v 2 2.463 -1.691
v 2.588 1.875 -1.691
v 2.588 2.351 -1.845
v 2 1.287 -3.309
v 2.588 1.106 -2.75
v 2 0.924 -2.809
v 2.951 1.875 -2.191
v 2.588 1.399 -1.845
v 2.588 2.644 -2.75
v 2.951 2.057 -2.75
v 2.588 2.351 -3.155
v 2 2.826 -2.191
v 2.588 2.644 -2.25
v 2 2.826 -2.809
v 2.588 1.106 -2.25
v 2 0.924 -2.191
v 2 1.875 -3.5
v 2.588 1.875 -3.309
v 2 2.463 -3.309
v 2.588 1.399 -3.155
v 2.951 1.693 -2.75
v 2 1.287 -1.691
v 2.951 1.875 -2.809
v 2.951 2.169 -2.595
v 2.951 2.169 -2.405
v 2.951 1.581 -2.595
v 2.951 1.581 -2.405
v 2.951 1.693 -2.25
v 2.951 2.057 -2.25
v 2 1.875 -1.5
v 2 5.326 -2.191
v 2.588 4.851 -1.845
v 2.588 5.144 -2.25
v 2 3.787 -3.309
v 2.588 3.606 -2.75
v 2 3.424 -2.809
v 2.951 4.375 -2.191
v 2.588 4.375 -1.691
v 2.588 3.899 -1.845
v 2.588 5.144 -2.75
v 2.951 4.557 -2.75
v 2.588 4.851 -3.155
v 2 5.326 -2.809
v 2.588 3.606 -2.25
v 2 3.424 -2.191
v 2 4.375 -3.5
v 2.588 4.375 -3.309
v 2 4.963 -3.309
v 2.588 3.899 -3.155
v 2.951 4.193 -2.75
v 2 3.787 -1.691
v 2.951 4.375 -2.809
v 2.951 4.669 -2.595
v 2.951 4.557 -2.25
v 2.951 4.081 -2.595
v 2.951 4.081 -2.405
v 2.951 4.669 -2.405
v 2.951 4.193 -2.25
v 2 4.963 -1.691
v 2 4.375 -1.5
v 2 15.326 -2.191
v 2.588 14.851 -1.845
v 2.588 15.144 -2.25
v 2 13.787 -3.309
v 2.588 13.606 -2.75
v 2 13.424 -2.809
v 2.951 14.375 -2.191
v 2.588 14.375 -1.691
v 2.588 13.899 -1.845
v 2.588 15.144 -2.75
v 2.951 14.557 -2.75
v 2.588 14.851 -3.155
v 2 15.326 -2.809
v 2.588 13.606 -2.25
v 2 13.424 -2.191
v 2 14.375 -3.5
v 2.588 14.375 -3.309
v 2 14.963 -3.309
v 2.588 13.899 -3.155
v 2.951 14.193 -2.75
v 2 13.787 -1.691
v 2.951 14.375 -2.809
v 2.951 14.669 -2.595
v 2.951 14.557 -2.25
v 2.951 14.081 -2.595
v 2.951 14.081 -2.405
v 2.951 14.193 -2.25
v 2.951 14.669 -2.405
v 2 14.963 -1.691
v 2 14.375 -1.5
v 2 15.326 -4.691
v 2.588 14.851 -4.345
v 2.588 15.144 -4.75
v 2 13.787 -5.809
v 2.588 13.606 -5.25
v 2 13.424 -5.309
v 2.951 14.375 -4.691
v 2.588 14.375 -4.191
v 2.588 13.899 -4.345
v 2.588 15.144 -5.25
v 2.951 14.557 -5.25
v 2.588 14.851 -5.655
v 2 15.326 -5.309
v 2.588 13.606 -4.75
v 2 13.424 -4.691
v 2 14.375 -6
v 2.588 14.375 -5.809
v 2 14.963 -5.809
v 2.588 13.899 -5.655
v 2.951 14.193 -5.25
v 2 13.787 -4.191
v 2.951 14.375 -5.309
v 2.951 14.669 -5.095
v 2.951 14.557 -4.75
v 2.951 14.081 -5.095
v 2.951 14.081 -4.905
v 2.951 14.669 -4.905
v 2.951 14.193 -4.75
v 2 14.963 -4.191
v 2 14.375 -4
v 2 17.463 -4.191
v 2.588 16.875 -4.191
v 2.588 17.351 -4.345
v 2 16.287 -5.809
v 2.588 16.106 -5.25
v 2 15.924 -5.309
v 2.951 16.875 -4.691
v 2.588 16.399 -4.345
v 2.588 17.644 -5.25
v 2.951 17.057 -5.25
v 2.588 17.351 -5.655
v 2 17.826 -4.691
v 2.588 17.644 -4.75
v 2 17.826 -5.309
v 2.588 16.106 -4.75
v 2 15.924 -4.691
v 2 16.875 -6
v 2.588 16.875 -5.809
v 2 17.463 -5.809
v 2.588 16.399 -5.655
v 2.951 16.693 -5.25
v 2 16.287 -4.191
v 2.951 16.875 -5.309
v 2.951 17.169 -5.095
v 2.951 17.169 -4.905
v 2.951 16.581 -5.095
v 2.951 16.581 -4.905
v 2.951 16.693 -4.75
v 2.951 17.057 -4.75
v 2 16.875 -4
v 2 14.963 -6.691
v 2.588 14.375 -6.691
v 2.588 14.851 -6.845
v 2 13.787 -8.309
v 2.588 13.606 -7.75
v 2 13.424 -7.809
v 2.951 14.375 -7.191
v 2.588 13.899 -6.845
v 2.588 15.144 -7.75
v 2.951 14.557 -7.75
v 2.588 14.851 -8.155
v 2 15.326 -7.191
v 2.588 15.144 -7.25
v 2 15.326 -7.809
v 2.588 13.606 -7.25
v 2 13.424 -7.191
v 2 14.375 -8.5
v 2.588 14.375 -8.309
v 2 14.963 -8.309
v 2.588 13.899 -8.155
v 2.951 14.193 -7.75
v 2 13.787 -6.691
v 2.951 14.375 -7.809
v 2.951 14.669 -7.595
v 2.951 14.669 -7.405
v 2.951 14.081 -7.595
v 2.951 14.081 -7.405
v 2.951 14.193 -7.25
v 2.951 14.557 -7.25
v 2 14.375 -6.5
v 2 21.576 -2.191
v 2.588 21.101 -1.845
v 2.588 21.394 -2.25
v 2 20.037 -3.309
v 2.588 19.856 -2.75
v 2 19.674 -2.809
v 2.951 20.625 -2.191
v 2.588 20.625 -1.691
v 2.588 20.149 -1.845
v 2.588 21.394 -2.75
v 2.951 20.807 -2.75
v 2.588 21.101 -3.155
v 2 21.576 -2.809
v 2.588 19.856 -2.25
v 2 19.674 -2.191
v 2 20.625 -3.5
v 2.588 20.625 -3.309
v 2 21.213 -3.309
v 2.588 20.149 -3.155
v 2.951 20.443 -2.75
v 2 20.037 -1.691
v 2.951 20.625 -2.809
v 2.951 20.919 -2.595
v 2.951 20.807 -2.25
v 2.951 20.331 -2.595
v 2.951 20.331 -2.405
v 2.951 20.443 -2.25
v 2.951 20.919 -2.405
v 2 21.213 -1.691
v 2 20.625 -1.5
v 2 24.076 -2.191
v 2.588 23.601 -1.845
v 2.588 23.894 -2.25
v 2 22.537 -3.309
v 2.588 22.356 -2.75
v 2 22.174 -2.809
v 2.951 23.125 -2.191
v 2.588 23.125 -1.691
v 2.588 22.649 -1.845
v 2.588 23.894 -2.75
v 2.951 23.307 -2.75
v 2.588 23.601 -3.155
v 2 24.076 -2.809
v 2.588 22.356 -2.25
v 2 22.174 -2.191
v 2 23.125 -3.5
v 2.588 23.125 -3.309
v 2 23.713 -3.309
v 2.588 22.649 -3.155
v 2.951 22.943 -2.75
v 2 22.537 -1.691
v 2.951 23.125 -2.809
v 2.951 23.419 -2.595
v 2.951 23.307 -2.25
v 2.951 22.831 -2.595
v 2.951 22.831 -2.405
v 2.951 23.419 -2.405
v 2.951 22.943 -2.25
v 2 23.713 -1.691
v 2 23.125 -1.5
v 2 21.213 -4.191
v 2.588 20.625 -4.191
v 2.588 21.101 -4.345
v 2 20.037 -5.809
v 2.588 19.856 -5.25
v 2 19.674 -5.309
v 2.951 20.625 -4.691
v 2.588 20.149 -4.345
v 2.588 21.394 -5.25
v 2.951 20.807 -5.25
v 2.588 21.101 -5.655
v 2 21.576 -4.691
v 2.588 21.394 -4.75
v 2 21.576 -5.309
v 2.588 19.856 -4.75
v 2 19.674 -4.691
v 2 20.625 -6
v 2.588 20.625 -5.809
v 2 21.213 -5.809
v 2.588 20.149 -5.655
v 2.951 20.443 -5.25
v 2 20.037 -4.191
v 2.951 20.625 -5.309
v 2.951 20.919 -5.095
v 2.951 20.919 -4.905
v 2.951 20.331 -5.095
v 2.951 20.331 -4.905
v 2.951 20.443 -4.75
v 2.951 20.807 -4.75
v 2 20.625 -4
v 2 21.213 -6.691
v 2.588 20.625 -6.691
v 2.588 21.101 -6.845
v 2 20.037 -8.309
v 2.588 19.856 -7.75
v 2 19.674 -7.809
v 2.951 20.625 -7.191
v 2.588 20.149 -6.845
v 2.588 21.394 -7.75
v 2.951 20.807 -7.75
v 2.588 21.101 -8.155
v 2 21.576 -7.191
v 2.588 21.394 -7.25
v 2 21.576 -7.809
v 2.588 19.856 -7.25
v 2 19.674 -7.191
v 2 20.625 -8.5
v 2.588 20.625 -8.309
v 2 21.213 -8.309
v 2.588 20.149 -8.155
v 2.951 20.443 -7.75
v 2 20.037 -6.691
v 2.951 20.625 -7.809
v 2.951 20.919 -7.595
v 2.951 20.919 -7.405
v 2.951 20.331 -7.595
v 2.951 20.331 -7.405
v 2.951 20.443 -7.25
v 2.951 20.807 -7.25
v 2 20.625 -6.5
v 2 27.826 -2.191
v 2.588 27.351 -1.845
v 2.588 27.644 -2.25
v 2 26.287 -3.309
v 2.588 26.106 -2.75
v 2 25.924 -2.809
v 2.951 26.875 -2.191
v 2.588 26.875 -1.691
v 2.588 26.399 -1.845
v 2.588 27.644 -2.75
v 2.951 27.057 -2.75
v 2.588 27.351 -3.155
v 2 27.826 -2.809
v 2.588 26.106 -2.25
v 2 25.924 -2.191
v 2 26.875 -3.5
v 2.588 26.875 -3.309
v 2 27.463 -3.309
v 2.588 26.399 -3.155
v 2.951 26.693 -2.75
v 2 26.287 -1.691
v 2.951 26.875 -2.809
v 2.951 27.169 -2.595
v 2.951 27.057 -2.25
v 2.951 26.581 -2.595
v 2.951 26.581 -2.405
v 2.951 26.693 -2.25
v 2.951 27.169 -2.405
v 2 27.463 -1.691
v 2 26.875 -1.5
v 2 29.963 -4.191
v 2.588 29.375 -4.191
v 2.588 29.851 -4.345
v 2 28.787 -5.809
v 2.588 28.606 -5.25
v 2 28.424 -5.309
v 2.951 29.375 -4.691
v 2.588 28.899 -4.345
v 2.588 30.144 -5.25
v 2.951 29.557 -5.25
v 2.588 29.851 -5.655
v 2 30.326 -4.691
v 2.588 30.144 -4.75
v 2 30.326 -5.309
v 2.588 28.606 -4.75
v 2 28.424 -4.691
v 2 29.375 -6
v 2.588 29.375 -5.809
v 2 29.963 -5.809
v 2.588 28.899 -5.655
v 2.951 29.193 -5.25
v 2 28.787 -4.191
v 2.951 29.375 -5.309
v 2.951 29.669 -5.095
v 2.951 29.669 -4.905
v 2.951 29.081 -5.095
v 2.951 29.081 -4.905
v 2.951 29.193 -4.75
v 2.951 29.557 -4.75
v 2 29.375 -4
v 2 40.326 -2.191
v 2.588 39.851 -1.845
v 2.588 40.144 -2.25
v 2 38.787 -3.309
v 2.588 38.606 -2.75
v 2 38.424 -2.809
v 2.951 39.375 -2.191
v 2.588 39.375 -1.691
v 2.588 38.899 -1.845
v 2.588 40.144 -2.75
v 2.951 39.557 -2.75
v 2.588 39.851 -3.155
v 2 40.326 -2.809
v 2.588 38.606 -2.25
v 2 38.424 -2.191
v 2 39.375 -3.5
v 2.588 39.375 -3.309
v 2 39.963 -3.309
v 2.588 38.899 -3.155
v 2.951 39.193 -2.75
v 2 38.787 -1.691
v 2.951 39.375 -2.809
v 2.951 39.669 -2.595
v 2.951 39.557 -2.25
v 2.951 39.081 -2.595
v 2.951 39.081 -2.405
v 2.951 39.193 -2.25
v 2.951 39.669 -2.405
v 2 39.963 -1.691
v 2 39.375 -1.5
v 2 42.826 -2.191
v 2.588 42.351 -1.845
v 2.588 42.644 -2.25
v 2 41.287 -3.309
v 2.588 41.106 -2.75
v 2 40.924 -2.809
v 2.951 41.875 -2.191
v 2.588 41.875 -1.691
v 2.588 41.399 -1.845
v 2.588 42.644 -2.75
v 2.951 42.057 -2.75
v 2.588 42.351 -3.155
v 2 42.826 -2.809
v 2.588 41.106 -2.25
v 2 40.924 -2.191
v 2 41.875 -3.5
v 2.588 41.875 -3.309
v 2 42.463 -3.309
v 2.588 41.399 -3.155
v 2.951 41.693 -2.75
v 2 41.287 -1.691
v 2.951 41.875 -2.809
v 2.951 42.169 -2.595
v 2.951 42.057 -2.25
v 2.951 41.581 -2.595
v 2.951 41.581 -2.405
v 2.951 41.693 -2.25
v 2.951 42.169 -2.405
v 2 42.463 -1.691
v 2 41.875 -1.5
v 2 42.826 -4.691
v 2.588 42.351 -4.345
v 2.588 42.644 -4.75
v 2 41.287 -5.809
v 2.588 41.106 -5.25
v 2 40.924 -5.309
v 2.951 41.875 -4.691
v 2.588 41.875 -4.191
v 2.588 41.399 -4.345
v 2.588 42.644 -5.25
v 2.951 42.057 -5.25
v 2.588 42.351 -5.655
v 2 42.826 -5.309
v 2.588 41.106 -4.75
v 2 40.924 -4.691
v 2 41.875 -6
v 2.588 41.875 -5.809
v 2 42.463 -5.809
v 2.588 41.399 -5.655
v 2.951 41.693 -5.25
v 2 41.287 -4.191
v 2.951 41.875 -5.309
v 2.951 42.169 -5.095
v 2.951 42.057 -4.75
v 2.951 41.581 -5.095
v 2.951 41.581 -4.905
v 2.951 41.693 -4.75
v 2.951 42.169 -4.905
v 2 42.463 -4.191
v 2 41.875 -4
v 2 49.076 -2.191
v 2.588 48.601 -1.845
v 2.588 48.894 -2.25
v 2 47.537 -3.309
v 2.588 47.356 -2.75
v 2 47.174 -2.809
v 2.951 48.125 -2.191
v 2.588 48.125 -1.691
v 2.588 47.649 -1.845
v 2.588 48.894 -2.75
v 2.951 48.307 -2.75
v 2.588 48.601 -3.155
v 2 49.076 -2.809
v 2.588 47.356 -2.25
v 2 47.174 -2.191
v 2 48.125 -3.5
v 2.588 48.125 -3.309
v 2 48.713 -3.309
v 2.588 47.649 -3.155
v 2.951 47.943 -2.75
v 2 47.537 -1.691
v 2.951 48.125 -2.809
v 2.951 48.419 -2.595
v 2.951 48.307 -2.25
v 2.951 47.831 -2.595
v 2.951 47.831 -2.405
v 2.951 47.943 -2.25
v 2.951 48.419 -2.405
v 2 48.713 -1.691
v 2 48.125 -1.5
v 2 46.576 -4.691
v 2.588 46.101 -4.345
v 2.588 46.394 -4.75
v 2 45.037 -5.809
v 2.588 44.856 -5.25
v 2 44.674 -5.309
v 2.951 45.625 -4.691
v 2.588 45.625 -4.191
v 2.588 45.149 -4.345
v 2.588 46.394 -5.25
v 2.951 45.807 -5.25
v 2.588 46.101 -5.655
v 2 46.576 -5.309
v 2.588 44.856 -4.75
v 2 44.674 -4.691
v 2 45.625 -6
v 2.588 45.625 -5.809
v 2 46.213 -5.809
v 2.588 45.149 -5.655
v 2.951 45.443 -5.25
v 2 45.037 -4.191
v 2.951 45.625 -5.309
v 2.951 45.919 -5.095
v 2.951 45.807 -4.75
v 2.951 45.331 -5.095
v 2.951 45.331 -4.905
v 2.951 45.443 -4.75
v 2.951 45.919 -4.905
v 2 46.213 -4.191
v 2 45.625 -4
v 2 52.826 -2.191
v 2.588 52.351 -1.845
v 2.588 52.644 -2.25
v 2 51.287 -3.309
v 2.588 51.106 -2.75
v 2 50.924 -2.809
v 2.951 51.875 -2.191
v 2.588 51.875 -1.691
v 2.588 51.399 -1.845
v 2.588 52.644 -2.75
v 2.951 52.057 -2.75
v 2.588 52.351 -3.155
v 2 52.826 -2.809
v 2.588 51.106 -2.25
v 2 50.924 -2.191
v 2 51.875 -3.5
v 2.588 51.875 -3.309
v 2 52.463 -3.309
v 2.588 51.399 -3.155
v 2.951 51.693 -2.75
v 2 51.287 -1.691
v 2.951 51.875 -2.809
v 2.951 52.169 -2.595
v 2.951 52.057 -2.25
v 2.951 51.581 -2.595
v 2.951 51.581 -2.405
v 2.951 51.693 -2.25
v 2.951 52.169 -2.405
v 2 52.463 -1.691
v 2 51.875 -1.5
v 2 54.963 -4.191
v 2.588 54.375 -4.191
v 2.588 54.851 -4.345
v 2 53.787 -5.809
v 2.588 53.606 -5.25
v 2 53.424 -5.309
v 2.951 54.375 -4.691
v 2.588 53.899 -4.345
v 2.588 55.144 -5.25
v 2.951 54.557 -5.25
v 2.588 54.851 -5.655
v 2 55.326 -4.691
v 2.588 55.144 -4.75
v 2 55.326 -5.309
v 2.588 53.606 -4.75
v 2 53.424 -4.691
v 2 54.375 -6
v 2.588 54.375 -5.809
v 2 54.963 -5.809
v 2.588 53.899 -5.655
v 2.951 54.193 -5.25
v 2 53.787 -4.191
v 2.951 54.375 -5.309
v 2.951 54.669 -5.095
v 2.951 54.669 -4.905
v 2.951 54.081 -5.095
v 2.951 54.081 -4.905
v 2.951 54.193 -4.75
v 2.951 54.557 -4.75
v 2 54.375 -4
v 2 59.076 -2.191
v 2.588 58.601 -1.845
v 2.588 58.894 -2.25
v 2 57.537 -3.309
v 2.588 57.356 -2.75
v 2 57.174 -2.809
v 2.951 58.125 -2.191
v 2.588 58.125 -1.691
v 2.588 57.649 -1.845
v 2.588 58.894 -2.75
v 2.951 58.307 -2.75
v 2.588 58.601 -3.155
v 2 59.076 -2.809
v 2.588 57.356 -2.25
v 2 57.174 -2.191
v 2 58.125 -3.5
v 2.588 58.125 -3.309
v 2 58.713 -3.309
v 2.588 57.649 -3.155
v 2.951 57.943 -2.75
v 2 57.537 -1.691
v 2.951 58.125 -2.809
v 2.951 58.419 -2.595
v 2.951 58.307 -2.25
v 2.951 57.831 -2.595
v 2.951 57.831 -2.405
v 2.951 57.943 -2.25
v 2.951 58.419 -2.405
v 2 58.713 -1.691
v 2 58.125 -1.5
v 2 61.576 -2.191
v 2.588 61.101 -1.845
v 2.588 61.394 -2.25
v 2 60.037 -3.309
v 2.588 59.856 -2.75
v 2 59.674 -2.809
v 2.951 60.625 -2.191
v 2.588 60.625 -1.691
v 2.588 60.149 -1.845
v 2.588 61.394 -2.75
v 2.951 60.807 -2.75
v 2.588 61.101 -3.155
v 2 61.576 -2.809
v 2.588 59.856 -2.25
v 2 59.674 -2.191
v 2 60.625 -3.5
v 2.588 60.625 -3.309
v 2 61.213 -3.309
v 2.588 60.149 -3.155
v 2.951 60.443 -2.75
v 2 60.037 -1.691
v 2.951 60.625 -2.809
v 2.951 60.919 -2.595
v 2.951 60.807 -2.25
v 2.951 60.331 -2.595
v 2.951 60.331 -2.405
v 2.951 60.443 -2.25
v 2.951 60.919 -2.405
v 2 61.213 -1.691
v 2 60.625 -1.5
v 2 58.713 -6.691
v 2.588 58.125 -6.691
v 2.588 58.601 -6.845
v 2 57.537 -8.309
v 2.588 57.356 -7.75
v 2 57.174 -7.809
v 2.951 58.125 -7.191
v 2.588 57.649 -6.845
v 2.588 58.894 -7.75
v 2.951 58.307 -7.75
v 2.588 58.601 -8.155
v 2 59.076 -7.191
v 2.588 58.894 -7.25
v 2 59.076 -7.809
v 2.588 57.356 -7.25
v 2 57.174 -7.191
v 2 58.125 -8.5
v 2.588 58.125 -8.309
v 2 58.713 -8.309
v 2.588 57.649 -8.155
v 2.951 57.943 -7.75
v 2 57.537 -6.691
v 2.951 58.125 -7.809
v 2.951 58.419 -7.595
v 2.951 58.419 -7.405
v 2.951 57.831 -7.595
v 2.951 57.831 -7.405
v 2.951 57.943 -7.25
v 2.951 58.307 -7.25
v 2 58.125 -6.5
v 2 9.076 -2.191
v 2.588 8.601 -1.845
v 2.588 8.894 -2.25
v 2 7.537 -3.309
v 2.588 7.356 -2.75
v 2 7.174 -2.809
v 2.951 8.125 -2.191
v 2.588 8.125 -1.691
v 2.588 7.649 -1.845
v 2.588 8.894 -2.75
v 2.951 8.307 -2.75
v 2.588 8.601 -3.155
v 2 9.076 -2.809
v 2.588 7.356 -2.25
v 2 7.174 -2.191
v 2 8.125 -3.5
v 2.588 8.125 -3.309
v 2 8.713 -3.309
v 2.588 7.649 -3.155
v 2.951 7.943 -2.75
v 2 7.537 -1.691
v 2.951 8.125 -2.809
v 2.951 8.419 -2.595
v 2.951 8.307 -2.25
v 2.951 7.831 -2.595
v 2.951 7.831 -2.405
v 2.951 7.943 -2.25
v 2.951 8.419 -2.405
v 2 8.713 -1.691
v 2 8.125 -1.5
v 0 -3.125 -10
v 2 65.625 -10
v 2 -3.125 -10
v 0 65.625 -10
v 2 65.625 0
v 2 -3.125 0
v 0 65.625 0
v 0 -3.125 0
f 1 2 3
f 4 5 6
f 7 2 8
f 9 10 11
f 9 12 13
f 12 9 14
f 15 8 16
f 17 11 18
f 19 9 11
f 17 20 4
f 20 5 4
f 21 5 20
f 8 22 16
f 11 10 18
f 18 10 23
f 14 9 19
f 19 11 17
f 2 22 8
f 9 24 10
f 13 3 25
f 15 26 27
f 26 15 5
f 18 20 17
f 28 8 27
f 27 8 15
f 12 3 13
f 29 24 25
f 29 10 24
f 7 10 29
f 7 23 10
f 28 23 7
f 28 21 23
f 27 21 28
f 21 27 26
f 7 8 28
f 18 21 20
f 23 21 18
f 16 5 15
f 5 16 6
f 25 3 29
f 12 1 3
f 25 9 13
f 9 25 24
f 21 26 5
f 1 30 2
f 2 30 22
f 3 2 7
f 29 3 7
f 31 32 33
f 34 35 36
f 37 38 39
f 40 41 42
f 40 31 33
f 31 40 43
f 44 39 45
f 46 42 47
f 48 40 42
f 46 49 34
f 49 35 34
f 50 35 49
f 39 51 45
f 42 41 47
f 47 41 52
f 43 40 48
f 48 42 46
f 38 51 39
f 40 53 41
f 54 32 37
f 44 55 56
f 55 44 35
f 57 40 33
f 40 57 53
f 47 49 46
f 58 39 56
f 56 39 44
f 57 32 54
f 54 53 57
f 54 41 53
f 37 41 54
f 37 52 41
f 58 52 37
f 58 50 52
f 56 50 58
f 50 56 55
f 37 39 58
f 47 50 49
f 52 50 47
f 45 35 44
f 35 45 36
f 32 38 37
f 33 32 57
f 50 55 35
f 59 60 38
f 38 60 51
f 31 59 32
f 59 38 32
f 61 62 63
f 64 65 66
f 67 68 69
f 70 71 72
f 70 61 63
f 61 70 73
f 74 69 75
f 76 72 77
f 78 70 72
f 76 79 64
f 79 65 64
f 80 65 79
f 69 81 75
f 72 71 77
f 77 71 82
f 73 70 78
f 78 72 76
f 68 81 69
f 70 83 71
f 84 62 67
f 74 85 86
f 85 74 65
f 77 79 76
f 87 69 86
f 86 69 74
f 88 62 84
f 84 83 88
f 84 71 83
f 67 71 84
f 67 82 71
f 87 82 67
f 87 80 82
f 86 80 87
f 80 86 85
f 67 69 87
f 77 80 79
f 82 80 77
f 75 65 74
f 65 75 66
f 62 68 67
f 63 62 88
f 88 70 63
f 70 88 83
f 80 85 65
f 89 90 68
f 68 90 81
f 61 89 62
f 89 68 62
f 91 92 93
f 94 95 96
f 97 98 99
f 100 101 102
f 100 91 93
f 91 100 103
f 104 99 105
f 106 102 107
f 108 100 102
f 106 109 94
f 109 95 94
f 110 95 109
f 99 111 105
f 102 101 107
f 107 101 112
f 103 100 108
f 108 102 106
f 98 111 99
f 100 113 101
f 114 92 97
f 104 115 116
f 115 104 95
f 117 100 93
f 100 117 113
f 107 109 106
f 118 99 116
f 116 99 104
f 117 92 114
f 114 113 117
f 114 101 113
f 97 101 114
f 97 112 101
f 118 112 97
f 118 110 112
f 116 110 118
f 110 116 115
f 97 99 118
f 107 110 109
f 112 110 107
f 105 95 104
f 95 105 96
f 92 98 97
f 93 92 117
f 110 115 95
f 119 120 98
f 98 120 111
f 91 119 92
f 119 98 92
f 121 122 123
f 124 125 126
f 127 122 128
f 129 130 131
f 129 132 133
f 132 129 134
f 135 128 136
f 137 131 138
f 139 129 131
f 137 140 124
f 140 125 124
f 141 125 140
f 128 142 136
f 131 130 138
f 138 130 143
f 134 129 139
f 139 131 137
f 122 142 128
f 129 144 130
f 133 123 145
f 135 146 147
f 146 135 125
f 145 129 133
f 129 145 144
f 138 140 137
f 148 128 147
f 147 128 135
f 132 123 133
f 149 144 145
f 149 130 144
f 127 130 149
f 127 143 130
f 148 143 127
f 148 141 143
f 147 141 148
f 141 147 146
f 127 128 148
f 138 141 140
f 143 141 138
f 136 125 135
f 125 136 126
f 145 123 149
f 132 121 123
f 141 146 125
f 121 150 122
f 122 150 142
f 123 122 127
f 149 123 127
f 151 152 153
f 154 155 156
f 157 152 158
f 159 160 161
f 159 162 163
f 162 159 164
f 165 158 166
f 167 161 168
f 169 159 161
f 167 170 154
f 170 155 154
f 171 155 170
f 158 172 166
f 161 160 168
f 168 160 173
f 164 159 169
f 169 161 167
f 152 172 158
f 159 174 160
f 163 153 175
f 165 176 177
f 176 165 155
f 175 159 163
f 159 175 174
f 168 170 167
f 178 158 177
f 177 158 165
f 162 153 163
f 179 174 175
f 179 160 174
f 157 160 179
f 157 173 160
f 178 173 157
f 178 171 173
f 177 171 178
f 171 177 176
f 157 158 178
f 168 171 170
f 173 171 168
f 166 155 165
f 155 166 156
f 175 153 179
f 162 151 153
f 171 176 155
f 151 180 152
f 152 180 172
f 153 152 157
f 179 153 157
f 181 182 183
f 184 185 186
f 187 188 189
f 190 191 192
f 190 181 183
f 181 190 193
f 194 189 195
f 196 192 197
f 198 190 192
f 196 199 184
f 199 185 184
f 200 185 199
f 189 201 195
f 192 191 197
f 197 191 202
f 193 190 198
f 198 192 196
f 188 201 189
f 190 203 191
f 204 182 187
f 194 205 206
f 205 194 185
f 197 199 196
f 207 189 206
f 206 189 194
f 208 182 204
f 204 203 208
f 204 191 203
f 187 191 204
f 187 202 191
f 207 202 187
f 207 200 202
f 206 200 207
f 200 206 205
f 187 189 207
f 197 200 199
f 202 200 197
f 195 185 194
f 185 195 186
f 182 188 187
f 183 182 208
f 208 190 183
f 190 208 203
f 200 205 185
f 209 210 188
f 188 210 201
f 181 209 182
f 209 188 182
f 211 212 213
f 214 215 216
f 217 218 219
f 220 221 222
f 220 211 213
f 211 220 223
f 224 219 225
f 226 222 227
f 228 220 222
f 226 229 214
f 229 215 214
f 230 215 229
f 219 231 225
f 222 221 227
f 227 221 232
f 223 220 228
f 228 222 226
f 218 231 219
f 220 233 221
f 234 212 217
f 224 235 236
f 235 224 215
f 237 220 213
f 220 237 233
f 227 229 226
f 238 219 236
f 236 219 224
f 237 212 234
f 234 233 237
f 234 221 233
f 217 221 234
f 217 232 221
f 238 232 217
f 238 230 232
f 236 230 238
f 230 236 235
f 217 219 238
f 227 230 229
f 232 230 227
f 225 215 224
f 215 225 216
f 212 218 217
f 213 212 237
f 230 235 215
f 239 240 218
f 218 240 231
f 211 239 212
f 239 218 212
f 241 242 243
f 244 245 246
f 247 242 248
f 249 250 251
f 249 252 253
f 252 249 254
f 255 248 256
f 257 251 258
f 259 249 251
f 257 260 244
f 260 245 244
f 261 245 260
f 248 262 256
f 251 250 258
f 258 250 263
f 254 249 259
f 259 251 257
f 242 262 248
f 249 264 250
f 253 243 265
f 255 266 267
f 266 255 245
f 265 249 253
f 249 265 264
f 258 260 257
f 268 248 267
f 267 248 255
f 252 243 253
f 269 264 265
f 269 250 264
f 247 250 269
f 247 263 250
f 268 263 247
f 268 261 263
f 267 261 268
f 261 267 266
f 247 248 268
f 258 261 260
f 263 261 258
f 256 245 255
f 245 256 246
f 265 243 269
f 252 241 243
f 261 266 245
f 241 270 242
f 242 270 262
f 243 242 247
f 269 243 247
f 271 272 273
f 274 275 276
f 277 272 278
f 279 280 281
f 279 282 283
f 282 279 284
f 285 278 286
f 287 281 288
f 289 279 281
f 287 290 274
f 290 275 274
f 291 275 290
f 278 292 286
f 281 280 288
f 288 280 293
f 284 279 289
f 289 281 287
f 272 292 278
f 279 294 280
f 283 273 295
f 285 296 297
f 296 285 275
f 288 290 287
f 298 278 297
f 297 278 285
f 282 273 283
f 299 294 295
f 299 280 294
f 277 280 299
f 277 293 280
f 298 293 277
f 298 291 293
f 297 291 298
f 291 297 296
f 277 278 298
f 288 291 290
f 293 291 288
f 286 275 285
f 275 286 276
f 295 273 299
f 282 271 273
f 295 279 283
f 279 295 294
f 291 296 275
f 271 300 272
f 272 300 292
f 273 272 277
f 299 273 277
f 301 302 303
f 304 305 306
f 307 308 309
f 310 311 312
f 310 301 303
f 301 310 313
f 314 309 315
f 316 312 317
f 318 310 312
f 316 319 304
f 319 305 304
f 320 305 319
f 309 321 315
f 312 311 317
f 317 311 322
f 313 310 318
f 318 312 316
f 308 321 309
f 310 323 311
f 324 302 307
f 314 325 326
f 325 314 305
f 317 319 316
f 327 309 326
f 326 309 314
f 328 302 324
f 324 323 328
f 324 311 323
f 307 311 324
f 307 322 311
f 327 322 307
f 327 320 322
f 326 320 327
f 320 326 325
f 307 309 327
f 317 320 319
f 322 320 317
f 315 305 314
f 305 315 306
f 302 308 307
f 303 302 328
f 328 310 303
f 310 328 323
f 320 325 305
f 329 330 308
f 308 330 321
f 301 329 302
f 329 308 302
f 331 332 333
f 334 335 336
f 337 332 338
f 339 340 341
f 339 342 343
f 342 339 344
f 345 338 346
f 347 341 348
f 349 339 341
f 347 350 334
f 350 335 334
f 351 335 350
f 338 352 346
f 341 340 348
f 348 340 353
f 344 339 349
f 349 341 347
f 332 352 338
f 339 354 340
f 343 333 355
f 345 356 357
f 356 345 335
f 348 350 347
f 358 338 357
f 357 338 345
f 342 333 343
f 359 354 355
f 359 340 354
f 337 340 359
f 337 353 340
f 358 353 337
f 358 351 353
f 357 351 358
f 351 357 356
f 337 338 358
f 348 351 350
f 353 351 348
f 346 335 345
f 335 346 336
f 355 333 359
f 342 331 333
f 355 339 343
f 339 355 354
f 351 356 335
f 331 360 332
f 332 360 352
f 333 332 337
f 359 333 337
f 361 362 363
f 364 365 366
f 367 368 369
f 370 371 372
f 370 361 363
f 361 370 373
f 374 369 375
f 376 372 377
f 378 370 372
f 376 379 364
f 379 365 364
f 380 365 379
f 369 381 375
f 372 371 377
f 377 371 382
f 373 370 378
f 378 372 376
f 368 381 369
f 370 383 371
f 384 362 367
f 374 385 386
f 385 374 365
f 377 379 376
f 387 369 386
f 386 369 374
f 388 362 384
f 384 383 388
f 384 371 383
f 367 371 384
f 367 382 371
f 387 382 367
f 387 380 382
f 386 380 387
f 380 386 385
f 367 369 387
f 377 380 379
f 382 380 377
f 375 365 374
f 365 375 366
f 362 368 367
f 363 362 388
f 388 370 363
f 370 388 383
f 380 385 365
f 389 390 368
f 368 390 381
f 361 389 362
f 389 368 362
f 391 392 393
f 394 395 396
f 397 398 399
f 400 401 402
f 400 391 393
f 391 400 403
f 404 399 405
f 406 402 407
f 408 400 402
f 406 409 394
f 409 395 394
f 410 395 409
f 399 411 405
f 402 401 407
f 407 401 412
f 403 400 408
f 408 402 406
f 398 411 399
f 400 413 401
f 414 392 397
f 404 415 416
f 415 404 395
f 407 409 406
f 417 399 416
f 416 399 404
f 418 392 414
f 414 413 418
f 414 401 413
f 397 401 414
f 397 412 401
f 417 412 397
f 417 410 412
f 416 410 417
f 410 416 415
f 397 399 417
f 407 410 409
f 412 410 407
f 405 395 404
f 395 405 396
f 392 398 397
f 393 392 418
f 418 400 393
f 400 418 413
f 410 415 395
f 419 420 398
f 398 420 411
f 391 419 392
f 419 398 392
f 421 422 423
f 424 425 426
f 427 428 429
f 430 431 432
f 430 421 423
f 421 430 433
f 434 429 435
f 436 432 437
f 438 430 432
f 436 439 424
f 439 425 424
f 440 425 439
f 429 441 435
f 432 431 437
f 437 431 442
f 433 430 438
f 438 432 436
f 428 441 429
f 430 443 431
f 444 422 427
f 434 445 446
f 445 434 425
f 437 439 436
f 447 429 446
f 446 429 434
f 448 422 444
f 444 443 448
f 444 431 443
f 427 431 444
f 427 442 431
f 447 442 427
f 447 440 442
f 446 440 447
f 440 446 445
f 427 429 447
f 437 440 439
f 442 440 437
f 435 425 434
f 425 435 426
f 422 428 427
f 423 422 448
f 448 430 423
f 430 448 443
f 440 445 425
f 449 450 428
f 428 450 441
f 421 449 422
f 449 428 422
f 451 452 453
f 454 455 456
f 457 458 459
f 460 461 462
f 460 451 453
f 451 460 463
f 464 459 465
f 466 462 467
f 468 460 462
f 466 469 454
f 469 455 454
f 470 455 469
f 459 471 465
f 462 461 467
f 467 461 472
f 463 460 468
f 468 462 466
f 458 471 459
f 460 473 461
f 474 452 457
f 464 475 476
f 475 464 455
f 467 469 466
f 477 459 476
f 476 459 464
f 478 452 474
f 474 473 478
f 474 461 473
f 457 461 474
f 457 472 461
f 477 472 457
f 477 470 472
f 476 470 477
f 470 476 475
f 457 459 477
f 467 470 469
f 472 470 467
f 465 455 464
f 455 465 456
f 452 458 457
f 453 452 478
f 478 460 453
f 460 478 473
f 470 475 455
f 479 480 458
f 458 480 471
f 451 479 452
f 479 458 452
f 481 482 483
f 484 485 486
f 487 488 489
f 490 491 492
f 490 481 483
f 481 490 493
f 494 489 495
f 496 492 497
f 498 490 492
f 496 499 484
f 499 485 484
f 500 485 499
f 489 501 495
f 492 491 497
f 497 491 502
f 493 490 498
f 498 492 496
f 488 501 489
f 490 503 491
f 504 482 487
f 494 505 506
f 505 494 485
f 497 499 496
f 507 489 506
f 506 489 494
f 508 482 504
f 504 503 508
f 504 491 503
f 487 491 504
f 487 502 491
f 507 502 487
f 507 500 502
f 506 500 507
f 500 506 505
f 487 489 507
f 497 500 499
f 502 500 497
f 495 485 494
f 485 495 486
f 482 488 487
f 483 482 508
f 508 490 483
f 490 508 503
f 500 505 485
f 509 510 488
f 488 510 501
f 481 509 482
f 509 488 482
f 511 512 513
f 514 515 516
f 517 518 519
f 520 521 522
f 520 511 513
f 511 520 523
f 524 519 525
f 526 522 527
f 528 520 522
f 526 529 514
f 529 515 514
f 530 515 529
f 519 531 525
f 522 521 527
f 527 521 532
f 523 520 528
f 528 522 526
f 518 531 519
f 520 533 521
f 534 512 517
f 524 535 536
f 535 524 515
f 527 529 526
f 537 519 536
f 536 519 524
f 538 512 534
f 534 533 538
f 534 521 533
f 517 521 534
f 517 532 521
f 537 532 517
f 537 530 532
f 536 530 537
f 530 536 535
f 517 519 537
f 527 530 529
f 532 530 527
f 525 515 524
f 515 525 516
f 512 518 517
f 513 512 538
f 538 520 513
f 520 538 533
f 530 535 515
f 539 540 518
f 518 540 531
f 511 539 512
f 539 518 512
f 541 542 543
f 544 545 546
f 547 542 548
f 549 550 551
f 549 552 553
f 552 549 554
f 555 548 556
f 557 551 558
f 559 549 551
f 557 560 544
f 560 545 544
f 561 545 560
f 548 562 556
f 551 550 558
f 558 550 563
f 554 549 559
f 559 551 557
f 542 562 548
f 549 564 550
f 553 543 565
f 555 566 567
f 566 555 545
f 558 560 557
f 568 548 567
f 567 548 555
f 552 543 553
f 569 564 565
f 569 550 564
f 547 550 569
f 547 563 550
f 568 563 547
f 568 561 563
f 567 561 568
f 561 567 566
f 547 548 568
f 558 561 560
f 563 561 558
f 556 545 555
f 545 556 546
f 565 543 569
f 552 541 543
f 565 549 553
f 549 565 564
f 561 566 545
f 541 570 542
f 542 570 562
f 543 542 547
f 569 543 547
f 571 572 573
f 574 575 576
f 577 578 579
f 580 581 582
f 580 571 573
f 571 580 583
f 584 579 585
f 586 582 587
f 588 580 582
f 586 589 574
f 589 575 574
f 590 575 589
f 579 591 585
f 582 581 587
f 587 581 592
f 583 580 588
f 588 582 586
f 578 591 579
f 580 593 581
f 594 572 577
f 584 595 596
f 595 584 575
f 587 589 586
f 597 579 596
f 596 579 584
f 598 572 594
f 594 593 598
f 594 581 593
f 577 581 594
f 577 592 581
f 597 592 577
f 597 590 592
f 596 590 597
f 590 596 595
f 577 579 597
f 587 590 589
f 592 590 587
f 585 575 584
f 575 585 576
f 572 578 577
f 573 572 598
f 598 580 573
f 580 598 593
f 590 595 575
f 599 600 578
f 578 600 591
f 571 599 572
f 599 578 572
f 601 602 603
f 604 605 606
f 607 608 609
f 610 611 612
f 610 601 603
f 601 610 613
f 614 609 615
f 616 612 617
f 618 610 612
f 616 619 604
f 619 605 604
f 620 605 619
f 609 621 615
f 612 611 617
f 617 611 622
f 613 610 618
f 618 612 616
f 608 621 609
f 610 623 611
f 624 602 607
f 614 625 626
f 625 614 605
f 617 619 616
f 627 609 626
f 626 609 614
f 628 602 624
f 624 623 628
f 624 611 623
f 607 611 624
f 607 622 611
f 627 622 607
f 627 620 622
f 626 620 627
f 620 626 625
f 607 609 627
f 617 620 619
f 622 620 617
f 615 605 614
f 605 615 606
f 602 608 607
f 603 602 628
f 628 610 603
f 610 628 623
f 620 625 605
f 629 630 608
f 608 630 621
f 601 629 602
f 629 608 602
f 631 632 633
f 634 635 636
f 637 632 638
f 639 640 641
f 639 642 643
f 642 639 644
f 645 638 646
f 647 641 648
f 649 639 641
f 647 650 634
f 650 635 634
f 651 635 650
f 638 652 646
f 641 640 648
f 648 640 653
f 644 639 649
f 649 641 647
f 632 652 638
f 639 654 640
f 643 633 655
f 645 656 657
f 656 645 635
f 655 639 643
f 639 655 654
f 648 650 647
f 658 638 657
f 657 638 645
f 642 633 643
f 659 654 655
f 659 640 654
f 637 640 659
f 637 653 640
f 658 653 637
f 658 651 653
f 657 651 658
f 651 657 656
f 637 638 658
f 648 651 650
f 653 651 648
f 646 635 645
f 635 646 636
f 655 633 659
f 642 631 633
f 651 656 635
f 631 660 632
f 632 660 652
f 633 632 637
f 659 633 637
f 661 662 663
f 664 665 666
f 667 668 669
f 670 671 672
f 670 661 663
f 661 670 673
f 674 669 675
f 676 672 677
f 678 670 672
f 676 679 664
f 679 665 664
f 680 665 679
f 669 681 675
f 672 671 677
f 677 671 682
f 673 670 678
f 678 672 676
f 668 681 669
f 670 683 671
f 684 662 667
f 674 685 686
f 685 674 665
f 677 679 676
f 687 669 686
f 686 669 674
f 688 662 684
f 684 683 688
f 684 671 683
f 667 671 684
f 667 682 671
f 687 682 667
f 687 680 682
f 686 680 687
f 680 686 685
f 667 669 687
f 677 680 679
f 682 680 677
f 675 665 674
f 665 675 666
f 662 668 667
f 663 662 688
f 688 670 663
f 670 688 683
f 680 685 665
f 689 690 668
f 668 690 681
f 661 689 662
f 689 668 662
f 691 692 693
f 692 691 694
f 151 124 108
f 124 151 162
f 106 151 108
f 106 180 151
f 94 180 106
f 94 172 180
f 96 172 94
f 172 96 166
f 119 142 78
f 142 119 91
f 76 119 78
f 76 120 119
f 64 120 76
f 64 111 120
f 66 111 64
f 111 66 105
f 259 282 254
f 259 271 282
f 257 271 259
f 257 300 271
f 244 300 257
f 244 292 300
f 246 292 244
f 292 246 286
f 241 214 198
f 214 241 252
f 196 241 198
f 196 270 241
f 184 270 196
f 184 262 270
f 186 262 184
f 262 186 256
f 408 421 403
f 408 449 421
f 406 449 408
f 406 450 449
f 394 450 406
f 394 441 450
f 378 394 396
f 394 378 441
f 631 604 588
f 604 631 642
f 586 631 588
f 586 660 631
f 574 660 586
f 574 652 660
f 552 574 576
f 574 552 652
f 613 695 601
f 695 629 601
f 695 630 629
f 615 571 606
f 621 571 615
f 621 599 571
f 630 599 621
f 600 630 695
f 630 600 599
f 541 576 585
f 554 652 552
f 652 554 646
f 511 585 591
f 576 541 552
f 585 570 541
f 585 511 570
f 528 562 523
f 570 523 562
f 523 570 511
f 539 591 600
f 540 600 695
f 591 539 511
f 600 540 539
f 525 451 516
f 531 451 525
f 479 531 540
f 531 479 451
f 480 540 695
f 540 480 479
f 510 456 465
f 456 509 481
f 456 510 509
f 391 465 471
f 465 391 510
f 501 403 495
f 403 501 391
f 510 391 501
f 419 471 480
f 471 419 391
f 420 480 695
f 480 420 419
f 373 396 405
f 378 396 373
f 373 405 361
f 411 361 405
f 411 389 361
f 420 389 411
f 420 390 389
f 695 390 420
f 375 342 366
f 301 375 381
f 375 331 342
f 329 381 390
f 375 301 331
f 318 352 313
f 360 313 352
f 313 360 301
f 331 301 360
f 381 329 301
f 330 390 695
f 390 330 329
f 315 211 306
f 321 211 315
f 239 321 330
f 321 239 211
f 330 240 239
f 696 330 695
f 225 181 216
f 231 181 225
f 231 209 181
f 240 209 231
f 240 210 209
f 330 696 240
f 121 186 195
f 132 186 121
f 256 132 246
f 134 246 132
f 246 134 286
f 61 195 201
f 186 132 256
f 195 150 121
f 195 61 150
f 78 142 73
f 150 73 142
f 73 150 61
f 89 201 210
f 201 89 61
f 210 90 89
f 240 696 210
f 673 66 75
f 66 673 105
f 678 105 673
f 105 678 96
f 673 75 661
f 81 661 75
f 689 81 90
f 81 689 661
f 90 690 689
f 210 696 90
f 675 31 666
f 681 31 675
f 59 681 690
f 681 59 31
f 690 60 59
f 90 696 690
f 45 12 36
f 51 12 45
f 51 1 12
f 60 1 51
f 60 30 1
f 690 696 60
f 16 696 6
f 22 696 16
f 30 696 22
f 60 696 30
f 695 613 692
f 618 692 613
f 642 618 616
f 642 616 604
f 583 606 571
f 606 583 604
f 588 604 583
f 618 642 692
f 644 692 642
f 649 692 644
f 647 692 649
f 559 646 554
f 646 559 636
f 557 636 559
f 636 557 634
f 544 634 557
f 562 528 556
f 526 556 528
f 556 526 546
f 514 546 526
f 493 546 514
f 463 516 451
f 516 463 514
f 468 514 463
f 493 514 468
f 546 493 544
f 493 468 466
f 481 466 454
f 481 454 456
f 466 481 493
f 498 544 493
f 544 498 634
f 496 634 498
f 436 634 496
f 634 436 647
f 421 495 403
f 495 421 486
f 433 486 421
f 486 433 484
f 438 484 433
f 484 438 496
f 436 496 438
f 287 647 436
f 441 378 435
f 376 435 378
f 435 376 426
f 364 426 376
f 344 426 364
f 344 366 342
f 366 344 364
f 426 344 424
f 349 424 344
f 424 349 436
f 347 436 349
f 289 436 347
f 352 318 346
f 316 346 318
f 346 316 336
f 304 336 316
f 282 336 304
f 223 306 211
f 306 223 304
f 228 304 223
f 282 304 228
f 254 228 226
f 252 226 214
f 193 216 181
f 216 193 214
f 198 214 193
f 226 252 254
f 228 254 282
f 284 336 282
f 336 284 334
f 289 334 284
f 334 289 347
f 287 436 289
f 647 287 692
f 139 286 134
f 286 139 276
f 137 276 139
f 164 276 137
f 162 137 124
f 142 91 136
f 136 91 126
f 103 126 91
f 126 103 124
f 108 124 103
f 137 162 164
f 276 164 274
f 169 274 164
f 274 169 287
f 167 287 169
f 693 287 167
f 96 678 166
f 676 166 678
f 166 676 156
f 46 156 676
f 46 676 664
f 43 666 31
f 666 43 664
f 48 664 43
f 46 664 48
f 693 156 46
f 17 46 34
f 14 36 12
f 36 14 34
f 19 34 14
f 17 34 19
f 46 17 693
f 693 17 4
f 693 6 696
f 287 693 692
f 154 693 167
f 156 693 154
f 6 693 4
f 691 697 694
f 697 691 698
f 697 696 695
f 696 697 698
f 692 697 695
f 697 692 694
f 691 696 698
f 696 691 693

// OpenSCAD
/*
Braille Module
http://creativecommons.org/licenses/by/3.0/
*/


// mm sizes from http://dots.physics.orst.edu/gs_layout.html
radius = 0.25;
spacing = 2.5;
distance = 3.75 + spacing;

plate_height = 10;
plate_thickness = 2;

$fn = 10;



module letter(bitmap) {
	row_size = 2;
	col_size = 3;
	bitmap_size = row_size * col_size;
	
	function loc_x(loc) = floor(loc / row_size) * spacing + spacing;
	function loc_y(loc) = loc % row_size * spacing  + (distance-spacing)/2;

	for (loc = [0:bitmap_size - 1]) {
		if (bitmap[loc] != 0) {
			union() {
				translate(v = [loc_x(loc), loc_y(loc), 0]) {
					sphere(radius = radius* bitmap[loc], center = true);
				}
			}
		}
	}
}


module braille_char(char) {
	if (char == "A") {
		letter([
			1,0,
			0,0,
			0,0
		]);
	} else if (char == "B") {
		letter([
			1,0,
			1,0,
			0,0
		]);
	} else if (char == "C") {
		letter([
			1,1,
			0,0,
			0,0
		]);
	} else if (char == "D") {
		letter([
			1,1,
			0,1,
			0,0
		]);
	} else if (char == "E") {
		letter([
			1,0,
			0,1,
			0,0
		]);
	} else if (char == "F") {
		letter([
			1,1,
			1,0,
			0,0
		]);
	} else if (char == "G") {
		letter([
			1,1,
			1,1,
			0,0
		]);
	} else if (char == "H") {
		letter([
			1,0,
			1,1,
			0,0
		]);
	} else if (char == "I") {
		letter([
			0,1,
			1,0,
			0,0
		]);
	} else if (char == "J") {
		letter([
			0,1,
			1,1,
			0,0
		]);
	} else if (char == "K") {
		letter([
			1,0,
			0,0,
			1,0
		]);
	} else if (char == "L") {
		letter([
			1,0,
			1,0,
			1,0
		]);
	} else if (char == "M") {
		letter([
			1,1,
			0,0,
			1,0
		]);
	} else if (char == "N") {
		letter([
			1,1,
			0,1,
			1,0
		]);
	} else if (char == "O") {
		letter([
			1,0,
			0,1,
			1,0
		]);
	} else if (char == "P") {
		letter([
			1,1,
			1,0,
			1,0
		]);
	} else if (char == "Q") {
		letter([
			1,1,
			1,1,
			1,0
		]);
	} else if (char == "R") {
		letter([
			1,0,
			1,1,
			1,0
		]);
	} else if (char == "S") {
		letter([
			0,1,
			1,0,
			1,0
		]);
	} else if (char == "T") {
		letter([
			0,1,
			1,1,
			1,0
		]);
	} else if (char == "U") {
		letter([
			1,0,
			0,0,
			1,1
		]);
	} else if (char == "V") {
		letter([
			1,0,
			1,1,
			1,0
		]);
	} else if (char == "W") {
		letter([
			0,1,
			1,1,
			0,1
		]);
	} else if (char == "X") {
		letter([
			1,1,
			0,0,
			1,1
		]);
	} else if (char == "Y") {
		letter([
			1,1,
			0,1,
			1,1
		]);
	} else if (char == "Z") {
		letter([
			1,0,
			0,1,
			1,1
		]);
	} else {
		echo("Invalid Character: ", char);
	}

}

module braille_str(chars, char_count) {
	echo(str("Total Width: ", distance * char_count, "mm"));
	union() {
		for (count = [0:char_count-1]) {
			translate(v = [0, count * distance, plate_thickness]) {
				braille_char(chars[count]);
			}
		}
		translate(v = [0, -distance/2, 0]) {
			color([0,0,1]) {
				cube(size = [plate_height, distance * (char_count+1), plate_thickness]);
			}
		}
	}
}






chars = ["C", "A", "R", "P", "E", " ", "D", "I", "E", "M" ];
char_count = 10;

union()
{
	rotate([0,90,0]) braille_str(chars, char_count);
	// uncomment next line to have a small "foot" added for better adhesion to the print platform or raft
	//translate([-19,20,-plate_height]) cube(size = [20,5,2]);
}
